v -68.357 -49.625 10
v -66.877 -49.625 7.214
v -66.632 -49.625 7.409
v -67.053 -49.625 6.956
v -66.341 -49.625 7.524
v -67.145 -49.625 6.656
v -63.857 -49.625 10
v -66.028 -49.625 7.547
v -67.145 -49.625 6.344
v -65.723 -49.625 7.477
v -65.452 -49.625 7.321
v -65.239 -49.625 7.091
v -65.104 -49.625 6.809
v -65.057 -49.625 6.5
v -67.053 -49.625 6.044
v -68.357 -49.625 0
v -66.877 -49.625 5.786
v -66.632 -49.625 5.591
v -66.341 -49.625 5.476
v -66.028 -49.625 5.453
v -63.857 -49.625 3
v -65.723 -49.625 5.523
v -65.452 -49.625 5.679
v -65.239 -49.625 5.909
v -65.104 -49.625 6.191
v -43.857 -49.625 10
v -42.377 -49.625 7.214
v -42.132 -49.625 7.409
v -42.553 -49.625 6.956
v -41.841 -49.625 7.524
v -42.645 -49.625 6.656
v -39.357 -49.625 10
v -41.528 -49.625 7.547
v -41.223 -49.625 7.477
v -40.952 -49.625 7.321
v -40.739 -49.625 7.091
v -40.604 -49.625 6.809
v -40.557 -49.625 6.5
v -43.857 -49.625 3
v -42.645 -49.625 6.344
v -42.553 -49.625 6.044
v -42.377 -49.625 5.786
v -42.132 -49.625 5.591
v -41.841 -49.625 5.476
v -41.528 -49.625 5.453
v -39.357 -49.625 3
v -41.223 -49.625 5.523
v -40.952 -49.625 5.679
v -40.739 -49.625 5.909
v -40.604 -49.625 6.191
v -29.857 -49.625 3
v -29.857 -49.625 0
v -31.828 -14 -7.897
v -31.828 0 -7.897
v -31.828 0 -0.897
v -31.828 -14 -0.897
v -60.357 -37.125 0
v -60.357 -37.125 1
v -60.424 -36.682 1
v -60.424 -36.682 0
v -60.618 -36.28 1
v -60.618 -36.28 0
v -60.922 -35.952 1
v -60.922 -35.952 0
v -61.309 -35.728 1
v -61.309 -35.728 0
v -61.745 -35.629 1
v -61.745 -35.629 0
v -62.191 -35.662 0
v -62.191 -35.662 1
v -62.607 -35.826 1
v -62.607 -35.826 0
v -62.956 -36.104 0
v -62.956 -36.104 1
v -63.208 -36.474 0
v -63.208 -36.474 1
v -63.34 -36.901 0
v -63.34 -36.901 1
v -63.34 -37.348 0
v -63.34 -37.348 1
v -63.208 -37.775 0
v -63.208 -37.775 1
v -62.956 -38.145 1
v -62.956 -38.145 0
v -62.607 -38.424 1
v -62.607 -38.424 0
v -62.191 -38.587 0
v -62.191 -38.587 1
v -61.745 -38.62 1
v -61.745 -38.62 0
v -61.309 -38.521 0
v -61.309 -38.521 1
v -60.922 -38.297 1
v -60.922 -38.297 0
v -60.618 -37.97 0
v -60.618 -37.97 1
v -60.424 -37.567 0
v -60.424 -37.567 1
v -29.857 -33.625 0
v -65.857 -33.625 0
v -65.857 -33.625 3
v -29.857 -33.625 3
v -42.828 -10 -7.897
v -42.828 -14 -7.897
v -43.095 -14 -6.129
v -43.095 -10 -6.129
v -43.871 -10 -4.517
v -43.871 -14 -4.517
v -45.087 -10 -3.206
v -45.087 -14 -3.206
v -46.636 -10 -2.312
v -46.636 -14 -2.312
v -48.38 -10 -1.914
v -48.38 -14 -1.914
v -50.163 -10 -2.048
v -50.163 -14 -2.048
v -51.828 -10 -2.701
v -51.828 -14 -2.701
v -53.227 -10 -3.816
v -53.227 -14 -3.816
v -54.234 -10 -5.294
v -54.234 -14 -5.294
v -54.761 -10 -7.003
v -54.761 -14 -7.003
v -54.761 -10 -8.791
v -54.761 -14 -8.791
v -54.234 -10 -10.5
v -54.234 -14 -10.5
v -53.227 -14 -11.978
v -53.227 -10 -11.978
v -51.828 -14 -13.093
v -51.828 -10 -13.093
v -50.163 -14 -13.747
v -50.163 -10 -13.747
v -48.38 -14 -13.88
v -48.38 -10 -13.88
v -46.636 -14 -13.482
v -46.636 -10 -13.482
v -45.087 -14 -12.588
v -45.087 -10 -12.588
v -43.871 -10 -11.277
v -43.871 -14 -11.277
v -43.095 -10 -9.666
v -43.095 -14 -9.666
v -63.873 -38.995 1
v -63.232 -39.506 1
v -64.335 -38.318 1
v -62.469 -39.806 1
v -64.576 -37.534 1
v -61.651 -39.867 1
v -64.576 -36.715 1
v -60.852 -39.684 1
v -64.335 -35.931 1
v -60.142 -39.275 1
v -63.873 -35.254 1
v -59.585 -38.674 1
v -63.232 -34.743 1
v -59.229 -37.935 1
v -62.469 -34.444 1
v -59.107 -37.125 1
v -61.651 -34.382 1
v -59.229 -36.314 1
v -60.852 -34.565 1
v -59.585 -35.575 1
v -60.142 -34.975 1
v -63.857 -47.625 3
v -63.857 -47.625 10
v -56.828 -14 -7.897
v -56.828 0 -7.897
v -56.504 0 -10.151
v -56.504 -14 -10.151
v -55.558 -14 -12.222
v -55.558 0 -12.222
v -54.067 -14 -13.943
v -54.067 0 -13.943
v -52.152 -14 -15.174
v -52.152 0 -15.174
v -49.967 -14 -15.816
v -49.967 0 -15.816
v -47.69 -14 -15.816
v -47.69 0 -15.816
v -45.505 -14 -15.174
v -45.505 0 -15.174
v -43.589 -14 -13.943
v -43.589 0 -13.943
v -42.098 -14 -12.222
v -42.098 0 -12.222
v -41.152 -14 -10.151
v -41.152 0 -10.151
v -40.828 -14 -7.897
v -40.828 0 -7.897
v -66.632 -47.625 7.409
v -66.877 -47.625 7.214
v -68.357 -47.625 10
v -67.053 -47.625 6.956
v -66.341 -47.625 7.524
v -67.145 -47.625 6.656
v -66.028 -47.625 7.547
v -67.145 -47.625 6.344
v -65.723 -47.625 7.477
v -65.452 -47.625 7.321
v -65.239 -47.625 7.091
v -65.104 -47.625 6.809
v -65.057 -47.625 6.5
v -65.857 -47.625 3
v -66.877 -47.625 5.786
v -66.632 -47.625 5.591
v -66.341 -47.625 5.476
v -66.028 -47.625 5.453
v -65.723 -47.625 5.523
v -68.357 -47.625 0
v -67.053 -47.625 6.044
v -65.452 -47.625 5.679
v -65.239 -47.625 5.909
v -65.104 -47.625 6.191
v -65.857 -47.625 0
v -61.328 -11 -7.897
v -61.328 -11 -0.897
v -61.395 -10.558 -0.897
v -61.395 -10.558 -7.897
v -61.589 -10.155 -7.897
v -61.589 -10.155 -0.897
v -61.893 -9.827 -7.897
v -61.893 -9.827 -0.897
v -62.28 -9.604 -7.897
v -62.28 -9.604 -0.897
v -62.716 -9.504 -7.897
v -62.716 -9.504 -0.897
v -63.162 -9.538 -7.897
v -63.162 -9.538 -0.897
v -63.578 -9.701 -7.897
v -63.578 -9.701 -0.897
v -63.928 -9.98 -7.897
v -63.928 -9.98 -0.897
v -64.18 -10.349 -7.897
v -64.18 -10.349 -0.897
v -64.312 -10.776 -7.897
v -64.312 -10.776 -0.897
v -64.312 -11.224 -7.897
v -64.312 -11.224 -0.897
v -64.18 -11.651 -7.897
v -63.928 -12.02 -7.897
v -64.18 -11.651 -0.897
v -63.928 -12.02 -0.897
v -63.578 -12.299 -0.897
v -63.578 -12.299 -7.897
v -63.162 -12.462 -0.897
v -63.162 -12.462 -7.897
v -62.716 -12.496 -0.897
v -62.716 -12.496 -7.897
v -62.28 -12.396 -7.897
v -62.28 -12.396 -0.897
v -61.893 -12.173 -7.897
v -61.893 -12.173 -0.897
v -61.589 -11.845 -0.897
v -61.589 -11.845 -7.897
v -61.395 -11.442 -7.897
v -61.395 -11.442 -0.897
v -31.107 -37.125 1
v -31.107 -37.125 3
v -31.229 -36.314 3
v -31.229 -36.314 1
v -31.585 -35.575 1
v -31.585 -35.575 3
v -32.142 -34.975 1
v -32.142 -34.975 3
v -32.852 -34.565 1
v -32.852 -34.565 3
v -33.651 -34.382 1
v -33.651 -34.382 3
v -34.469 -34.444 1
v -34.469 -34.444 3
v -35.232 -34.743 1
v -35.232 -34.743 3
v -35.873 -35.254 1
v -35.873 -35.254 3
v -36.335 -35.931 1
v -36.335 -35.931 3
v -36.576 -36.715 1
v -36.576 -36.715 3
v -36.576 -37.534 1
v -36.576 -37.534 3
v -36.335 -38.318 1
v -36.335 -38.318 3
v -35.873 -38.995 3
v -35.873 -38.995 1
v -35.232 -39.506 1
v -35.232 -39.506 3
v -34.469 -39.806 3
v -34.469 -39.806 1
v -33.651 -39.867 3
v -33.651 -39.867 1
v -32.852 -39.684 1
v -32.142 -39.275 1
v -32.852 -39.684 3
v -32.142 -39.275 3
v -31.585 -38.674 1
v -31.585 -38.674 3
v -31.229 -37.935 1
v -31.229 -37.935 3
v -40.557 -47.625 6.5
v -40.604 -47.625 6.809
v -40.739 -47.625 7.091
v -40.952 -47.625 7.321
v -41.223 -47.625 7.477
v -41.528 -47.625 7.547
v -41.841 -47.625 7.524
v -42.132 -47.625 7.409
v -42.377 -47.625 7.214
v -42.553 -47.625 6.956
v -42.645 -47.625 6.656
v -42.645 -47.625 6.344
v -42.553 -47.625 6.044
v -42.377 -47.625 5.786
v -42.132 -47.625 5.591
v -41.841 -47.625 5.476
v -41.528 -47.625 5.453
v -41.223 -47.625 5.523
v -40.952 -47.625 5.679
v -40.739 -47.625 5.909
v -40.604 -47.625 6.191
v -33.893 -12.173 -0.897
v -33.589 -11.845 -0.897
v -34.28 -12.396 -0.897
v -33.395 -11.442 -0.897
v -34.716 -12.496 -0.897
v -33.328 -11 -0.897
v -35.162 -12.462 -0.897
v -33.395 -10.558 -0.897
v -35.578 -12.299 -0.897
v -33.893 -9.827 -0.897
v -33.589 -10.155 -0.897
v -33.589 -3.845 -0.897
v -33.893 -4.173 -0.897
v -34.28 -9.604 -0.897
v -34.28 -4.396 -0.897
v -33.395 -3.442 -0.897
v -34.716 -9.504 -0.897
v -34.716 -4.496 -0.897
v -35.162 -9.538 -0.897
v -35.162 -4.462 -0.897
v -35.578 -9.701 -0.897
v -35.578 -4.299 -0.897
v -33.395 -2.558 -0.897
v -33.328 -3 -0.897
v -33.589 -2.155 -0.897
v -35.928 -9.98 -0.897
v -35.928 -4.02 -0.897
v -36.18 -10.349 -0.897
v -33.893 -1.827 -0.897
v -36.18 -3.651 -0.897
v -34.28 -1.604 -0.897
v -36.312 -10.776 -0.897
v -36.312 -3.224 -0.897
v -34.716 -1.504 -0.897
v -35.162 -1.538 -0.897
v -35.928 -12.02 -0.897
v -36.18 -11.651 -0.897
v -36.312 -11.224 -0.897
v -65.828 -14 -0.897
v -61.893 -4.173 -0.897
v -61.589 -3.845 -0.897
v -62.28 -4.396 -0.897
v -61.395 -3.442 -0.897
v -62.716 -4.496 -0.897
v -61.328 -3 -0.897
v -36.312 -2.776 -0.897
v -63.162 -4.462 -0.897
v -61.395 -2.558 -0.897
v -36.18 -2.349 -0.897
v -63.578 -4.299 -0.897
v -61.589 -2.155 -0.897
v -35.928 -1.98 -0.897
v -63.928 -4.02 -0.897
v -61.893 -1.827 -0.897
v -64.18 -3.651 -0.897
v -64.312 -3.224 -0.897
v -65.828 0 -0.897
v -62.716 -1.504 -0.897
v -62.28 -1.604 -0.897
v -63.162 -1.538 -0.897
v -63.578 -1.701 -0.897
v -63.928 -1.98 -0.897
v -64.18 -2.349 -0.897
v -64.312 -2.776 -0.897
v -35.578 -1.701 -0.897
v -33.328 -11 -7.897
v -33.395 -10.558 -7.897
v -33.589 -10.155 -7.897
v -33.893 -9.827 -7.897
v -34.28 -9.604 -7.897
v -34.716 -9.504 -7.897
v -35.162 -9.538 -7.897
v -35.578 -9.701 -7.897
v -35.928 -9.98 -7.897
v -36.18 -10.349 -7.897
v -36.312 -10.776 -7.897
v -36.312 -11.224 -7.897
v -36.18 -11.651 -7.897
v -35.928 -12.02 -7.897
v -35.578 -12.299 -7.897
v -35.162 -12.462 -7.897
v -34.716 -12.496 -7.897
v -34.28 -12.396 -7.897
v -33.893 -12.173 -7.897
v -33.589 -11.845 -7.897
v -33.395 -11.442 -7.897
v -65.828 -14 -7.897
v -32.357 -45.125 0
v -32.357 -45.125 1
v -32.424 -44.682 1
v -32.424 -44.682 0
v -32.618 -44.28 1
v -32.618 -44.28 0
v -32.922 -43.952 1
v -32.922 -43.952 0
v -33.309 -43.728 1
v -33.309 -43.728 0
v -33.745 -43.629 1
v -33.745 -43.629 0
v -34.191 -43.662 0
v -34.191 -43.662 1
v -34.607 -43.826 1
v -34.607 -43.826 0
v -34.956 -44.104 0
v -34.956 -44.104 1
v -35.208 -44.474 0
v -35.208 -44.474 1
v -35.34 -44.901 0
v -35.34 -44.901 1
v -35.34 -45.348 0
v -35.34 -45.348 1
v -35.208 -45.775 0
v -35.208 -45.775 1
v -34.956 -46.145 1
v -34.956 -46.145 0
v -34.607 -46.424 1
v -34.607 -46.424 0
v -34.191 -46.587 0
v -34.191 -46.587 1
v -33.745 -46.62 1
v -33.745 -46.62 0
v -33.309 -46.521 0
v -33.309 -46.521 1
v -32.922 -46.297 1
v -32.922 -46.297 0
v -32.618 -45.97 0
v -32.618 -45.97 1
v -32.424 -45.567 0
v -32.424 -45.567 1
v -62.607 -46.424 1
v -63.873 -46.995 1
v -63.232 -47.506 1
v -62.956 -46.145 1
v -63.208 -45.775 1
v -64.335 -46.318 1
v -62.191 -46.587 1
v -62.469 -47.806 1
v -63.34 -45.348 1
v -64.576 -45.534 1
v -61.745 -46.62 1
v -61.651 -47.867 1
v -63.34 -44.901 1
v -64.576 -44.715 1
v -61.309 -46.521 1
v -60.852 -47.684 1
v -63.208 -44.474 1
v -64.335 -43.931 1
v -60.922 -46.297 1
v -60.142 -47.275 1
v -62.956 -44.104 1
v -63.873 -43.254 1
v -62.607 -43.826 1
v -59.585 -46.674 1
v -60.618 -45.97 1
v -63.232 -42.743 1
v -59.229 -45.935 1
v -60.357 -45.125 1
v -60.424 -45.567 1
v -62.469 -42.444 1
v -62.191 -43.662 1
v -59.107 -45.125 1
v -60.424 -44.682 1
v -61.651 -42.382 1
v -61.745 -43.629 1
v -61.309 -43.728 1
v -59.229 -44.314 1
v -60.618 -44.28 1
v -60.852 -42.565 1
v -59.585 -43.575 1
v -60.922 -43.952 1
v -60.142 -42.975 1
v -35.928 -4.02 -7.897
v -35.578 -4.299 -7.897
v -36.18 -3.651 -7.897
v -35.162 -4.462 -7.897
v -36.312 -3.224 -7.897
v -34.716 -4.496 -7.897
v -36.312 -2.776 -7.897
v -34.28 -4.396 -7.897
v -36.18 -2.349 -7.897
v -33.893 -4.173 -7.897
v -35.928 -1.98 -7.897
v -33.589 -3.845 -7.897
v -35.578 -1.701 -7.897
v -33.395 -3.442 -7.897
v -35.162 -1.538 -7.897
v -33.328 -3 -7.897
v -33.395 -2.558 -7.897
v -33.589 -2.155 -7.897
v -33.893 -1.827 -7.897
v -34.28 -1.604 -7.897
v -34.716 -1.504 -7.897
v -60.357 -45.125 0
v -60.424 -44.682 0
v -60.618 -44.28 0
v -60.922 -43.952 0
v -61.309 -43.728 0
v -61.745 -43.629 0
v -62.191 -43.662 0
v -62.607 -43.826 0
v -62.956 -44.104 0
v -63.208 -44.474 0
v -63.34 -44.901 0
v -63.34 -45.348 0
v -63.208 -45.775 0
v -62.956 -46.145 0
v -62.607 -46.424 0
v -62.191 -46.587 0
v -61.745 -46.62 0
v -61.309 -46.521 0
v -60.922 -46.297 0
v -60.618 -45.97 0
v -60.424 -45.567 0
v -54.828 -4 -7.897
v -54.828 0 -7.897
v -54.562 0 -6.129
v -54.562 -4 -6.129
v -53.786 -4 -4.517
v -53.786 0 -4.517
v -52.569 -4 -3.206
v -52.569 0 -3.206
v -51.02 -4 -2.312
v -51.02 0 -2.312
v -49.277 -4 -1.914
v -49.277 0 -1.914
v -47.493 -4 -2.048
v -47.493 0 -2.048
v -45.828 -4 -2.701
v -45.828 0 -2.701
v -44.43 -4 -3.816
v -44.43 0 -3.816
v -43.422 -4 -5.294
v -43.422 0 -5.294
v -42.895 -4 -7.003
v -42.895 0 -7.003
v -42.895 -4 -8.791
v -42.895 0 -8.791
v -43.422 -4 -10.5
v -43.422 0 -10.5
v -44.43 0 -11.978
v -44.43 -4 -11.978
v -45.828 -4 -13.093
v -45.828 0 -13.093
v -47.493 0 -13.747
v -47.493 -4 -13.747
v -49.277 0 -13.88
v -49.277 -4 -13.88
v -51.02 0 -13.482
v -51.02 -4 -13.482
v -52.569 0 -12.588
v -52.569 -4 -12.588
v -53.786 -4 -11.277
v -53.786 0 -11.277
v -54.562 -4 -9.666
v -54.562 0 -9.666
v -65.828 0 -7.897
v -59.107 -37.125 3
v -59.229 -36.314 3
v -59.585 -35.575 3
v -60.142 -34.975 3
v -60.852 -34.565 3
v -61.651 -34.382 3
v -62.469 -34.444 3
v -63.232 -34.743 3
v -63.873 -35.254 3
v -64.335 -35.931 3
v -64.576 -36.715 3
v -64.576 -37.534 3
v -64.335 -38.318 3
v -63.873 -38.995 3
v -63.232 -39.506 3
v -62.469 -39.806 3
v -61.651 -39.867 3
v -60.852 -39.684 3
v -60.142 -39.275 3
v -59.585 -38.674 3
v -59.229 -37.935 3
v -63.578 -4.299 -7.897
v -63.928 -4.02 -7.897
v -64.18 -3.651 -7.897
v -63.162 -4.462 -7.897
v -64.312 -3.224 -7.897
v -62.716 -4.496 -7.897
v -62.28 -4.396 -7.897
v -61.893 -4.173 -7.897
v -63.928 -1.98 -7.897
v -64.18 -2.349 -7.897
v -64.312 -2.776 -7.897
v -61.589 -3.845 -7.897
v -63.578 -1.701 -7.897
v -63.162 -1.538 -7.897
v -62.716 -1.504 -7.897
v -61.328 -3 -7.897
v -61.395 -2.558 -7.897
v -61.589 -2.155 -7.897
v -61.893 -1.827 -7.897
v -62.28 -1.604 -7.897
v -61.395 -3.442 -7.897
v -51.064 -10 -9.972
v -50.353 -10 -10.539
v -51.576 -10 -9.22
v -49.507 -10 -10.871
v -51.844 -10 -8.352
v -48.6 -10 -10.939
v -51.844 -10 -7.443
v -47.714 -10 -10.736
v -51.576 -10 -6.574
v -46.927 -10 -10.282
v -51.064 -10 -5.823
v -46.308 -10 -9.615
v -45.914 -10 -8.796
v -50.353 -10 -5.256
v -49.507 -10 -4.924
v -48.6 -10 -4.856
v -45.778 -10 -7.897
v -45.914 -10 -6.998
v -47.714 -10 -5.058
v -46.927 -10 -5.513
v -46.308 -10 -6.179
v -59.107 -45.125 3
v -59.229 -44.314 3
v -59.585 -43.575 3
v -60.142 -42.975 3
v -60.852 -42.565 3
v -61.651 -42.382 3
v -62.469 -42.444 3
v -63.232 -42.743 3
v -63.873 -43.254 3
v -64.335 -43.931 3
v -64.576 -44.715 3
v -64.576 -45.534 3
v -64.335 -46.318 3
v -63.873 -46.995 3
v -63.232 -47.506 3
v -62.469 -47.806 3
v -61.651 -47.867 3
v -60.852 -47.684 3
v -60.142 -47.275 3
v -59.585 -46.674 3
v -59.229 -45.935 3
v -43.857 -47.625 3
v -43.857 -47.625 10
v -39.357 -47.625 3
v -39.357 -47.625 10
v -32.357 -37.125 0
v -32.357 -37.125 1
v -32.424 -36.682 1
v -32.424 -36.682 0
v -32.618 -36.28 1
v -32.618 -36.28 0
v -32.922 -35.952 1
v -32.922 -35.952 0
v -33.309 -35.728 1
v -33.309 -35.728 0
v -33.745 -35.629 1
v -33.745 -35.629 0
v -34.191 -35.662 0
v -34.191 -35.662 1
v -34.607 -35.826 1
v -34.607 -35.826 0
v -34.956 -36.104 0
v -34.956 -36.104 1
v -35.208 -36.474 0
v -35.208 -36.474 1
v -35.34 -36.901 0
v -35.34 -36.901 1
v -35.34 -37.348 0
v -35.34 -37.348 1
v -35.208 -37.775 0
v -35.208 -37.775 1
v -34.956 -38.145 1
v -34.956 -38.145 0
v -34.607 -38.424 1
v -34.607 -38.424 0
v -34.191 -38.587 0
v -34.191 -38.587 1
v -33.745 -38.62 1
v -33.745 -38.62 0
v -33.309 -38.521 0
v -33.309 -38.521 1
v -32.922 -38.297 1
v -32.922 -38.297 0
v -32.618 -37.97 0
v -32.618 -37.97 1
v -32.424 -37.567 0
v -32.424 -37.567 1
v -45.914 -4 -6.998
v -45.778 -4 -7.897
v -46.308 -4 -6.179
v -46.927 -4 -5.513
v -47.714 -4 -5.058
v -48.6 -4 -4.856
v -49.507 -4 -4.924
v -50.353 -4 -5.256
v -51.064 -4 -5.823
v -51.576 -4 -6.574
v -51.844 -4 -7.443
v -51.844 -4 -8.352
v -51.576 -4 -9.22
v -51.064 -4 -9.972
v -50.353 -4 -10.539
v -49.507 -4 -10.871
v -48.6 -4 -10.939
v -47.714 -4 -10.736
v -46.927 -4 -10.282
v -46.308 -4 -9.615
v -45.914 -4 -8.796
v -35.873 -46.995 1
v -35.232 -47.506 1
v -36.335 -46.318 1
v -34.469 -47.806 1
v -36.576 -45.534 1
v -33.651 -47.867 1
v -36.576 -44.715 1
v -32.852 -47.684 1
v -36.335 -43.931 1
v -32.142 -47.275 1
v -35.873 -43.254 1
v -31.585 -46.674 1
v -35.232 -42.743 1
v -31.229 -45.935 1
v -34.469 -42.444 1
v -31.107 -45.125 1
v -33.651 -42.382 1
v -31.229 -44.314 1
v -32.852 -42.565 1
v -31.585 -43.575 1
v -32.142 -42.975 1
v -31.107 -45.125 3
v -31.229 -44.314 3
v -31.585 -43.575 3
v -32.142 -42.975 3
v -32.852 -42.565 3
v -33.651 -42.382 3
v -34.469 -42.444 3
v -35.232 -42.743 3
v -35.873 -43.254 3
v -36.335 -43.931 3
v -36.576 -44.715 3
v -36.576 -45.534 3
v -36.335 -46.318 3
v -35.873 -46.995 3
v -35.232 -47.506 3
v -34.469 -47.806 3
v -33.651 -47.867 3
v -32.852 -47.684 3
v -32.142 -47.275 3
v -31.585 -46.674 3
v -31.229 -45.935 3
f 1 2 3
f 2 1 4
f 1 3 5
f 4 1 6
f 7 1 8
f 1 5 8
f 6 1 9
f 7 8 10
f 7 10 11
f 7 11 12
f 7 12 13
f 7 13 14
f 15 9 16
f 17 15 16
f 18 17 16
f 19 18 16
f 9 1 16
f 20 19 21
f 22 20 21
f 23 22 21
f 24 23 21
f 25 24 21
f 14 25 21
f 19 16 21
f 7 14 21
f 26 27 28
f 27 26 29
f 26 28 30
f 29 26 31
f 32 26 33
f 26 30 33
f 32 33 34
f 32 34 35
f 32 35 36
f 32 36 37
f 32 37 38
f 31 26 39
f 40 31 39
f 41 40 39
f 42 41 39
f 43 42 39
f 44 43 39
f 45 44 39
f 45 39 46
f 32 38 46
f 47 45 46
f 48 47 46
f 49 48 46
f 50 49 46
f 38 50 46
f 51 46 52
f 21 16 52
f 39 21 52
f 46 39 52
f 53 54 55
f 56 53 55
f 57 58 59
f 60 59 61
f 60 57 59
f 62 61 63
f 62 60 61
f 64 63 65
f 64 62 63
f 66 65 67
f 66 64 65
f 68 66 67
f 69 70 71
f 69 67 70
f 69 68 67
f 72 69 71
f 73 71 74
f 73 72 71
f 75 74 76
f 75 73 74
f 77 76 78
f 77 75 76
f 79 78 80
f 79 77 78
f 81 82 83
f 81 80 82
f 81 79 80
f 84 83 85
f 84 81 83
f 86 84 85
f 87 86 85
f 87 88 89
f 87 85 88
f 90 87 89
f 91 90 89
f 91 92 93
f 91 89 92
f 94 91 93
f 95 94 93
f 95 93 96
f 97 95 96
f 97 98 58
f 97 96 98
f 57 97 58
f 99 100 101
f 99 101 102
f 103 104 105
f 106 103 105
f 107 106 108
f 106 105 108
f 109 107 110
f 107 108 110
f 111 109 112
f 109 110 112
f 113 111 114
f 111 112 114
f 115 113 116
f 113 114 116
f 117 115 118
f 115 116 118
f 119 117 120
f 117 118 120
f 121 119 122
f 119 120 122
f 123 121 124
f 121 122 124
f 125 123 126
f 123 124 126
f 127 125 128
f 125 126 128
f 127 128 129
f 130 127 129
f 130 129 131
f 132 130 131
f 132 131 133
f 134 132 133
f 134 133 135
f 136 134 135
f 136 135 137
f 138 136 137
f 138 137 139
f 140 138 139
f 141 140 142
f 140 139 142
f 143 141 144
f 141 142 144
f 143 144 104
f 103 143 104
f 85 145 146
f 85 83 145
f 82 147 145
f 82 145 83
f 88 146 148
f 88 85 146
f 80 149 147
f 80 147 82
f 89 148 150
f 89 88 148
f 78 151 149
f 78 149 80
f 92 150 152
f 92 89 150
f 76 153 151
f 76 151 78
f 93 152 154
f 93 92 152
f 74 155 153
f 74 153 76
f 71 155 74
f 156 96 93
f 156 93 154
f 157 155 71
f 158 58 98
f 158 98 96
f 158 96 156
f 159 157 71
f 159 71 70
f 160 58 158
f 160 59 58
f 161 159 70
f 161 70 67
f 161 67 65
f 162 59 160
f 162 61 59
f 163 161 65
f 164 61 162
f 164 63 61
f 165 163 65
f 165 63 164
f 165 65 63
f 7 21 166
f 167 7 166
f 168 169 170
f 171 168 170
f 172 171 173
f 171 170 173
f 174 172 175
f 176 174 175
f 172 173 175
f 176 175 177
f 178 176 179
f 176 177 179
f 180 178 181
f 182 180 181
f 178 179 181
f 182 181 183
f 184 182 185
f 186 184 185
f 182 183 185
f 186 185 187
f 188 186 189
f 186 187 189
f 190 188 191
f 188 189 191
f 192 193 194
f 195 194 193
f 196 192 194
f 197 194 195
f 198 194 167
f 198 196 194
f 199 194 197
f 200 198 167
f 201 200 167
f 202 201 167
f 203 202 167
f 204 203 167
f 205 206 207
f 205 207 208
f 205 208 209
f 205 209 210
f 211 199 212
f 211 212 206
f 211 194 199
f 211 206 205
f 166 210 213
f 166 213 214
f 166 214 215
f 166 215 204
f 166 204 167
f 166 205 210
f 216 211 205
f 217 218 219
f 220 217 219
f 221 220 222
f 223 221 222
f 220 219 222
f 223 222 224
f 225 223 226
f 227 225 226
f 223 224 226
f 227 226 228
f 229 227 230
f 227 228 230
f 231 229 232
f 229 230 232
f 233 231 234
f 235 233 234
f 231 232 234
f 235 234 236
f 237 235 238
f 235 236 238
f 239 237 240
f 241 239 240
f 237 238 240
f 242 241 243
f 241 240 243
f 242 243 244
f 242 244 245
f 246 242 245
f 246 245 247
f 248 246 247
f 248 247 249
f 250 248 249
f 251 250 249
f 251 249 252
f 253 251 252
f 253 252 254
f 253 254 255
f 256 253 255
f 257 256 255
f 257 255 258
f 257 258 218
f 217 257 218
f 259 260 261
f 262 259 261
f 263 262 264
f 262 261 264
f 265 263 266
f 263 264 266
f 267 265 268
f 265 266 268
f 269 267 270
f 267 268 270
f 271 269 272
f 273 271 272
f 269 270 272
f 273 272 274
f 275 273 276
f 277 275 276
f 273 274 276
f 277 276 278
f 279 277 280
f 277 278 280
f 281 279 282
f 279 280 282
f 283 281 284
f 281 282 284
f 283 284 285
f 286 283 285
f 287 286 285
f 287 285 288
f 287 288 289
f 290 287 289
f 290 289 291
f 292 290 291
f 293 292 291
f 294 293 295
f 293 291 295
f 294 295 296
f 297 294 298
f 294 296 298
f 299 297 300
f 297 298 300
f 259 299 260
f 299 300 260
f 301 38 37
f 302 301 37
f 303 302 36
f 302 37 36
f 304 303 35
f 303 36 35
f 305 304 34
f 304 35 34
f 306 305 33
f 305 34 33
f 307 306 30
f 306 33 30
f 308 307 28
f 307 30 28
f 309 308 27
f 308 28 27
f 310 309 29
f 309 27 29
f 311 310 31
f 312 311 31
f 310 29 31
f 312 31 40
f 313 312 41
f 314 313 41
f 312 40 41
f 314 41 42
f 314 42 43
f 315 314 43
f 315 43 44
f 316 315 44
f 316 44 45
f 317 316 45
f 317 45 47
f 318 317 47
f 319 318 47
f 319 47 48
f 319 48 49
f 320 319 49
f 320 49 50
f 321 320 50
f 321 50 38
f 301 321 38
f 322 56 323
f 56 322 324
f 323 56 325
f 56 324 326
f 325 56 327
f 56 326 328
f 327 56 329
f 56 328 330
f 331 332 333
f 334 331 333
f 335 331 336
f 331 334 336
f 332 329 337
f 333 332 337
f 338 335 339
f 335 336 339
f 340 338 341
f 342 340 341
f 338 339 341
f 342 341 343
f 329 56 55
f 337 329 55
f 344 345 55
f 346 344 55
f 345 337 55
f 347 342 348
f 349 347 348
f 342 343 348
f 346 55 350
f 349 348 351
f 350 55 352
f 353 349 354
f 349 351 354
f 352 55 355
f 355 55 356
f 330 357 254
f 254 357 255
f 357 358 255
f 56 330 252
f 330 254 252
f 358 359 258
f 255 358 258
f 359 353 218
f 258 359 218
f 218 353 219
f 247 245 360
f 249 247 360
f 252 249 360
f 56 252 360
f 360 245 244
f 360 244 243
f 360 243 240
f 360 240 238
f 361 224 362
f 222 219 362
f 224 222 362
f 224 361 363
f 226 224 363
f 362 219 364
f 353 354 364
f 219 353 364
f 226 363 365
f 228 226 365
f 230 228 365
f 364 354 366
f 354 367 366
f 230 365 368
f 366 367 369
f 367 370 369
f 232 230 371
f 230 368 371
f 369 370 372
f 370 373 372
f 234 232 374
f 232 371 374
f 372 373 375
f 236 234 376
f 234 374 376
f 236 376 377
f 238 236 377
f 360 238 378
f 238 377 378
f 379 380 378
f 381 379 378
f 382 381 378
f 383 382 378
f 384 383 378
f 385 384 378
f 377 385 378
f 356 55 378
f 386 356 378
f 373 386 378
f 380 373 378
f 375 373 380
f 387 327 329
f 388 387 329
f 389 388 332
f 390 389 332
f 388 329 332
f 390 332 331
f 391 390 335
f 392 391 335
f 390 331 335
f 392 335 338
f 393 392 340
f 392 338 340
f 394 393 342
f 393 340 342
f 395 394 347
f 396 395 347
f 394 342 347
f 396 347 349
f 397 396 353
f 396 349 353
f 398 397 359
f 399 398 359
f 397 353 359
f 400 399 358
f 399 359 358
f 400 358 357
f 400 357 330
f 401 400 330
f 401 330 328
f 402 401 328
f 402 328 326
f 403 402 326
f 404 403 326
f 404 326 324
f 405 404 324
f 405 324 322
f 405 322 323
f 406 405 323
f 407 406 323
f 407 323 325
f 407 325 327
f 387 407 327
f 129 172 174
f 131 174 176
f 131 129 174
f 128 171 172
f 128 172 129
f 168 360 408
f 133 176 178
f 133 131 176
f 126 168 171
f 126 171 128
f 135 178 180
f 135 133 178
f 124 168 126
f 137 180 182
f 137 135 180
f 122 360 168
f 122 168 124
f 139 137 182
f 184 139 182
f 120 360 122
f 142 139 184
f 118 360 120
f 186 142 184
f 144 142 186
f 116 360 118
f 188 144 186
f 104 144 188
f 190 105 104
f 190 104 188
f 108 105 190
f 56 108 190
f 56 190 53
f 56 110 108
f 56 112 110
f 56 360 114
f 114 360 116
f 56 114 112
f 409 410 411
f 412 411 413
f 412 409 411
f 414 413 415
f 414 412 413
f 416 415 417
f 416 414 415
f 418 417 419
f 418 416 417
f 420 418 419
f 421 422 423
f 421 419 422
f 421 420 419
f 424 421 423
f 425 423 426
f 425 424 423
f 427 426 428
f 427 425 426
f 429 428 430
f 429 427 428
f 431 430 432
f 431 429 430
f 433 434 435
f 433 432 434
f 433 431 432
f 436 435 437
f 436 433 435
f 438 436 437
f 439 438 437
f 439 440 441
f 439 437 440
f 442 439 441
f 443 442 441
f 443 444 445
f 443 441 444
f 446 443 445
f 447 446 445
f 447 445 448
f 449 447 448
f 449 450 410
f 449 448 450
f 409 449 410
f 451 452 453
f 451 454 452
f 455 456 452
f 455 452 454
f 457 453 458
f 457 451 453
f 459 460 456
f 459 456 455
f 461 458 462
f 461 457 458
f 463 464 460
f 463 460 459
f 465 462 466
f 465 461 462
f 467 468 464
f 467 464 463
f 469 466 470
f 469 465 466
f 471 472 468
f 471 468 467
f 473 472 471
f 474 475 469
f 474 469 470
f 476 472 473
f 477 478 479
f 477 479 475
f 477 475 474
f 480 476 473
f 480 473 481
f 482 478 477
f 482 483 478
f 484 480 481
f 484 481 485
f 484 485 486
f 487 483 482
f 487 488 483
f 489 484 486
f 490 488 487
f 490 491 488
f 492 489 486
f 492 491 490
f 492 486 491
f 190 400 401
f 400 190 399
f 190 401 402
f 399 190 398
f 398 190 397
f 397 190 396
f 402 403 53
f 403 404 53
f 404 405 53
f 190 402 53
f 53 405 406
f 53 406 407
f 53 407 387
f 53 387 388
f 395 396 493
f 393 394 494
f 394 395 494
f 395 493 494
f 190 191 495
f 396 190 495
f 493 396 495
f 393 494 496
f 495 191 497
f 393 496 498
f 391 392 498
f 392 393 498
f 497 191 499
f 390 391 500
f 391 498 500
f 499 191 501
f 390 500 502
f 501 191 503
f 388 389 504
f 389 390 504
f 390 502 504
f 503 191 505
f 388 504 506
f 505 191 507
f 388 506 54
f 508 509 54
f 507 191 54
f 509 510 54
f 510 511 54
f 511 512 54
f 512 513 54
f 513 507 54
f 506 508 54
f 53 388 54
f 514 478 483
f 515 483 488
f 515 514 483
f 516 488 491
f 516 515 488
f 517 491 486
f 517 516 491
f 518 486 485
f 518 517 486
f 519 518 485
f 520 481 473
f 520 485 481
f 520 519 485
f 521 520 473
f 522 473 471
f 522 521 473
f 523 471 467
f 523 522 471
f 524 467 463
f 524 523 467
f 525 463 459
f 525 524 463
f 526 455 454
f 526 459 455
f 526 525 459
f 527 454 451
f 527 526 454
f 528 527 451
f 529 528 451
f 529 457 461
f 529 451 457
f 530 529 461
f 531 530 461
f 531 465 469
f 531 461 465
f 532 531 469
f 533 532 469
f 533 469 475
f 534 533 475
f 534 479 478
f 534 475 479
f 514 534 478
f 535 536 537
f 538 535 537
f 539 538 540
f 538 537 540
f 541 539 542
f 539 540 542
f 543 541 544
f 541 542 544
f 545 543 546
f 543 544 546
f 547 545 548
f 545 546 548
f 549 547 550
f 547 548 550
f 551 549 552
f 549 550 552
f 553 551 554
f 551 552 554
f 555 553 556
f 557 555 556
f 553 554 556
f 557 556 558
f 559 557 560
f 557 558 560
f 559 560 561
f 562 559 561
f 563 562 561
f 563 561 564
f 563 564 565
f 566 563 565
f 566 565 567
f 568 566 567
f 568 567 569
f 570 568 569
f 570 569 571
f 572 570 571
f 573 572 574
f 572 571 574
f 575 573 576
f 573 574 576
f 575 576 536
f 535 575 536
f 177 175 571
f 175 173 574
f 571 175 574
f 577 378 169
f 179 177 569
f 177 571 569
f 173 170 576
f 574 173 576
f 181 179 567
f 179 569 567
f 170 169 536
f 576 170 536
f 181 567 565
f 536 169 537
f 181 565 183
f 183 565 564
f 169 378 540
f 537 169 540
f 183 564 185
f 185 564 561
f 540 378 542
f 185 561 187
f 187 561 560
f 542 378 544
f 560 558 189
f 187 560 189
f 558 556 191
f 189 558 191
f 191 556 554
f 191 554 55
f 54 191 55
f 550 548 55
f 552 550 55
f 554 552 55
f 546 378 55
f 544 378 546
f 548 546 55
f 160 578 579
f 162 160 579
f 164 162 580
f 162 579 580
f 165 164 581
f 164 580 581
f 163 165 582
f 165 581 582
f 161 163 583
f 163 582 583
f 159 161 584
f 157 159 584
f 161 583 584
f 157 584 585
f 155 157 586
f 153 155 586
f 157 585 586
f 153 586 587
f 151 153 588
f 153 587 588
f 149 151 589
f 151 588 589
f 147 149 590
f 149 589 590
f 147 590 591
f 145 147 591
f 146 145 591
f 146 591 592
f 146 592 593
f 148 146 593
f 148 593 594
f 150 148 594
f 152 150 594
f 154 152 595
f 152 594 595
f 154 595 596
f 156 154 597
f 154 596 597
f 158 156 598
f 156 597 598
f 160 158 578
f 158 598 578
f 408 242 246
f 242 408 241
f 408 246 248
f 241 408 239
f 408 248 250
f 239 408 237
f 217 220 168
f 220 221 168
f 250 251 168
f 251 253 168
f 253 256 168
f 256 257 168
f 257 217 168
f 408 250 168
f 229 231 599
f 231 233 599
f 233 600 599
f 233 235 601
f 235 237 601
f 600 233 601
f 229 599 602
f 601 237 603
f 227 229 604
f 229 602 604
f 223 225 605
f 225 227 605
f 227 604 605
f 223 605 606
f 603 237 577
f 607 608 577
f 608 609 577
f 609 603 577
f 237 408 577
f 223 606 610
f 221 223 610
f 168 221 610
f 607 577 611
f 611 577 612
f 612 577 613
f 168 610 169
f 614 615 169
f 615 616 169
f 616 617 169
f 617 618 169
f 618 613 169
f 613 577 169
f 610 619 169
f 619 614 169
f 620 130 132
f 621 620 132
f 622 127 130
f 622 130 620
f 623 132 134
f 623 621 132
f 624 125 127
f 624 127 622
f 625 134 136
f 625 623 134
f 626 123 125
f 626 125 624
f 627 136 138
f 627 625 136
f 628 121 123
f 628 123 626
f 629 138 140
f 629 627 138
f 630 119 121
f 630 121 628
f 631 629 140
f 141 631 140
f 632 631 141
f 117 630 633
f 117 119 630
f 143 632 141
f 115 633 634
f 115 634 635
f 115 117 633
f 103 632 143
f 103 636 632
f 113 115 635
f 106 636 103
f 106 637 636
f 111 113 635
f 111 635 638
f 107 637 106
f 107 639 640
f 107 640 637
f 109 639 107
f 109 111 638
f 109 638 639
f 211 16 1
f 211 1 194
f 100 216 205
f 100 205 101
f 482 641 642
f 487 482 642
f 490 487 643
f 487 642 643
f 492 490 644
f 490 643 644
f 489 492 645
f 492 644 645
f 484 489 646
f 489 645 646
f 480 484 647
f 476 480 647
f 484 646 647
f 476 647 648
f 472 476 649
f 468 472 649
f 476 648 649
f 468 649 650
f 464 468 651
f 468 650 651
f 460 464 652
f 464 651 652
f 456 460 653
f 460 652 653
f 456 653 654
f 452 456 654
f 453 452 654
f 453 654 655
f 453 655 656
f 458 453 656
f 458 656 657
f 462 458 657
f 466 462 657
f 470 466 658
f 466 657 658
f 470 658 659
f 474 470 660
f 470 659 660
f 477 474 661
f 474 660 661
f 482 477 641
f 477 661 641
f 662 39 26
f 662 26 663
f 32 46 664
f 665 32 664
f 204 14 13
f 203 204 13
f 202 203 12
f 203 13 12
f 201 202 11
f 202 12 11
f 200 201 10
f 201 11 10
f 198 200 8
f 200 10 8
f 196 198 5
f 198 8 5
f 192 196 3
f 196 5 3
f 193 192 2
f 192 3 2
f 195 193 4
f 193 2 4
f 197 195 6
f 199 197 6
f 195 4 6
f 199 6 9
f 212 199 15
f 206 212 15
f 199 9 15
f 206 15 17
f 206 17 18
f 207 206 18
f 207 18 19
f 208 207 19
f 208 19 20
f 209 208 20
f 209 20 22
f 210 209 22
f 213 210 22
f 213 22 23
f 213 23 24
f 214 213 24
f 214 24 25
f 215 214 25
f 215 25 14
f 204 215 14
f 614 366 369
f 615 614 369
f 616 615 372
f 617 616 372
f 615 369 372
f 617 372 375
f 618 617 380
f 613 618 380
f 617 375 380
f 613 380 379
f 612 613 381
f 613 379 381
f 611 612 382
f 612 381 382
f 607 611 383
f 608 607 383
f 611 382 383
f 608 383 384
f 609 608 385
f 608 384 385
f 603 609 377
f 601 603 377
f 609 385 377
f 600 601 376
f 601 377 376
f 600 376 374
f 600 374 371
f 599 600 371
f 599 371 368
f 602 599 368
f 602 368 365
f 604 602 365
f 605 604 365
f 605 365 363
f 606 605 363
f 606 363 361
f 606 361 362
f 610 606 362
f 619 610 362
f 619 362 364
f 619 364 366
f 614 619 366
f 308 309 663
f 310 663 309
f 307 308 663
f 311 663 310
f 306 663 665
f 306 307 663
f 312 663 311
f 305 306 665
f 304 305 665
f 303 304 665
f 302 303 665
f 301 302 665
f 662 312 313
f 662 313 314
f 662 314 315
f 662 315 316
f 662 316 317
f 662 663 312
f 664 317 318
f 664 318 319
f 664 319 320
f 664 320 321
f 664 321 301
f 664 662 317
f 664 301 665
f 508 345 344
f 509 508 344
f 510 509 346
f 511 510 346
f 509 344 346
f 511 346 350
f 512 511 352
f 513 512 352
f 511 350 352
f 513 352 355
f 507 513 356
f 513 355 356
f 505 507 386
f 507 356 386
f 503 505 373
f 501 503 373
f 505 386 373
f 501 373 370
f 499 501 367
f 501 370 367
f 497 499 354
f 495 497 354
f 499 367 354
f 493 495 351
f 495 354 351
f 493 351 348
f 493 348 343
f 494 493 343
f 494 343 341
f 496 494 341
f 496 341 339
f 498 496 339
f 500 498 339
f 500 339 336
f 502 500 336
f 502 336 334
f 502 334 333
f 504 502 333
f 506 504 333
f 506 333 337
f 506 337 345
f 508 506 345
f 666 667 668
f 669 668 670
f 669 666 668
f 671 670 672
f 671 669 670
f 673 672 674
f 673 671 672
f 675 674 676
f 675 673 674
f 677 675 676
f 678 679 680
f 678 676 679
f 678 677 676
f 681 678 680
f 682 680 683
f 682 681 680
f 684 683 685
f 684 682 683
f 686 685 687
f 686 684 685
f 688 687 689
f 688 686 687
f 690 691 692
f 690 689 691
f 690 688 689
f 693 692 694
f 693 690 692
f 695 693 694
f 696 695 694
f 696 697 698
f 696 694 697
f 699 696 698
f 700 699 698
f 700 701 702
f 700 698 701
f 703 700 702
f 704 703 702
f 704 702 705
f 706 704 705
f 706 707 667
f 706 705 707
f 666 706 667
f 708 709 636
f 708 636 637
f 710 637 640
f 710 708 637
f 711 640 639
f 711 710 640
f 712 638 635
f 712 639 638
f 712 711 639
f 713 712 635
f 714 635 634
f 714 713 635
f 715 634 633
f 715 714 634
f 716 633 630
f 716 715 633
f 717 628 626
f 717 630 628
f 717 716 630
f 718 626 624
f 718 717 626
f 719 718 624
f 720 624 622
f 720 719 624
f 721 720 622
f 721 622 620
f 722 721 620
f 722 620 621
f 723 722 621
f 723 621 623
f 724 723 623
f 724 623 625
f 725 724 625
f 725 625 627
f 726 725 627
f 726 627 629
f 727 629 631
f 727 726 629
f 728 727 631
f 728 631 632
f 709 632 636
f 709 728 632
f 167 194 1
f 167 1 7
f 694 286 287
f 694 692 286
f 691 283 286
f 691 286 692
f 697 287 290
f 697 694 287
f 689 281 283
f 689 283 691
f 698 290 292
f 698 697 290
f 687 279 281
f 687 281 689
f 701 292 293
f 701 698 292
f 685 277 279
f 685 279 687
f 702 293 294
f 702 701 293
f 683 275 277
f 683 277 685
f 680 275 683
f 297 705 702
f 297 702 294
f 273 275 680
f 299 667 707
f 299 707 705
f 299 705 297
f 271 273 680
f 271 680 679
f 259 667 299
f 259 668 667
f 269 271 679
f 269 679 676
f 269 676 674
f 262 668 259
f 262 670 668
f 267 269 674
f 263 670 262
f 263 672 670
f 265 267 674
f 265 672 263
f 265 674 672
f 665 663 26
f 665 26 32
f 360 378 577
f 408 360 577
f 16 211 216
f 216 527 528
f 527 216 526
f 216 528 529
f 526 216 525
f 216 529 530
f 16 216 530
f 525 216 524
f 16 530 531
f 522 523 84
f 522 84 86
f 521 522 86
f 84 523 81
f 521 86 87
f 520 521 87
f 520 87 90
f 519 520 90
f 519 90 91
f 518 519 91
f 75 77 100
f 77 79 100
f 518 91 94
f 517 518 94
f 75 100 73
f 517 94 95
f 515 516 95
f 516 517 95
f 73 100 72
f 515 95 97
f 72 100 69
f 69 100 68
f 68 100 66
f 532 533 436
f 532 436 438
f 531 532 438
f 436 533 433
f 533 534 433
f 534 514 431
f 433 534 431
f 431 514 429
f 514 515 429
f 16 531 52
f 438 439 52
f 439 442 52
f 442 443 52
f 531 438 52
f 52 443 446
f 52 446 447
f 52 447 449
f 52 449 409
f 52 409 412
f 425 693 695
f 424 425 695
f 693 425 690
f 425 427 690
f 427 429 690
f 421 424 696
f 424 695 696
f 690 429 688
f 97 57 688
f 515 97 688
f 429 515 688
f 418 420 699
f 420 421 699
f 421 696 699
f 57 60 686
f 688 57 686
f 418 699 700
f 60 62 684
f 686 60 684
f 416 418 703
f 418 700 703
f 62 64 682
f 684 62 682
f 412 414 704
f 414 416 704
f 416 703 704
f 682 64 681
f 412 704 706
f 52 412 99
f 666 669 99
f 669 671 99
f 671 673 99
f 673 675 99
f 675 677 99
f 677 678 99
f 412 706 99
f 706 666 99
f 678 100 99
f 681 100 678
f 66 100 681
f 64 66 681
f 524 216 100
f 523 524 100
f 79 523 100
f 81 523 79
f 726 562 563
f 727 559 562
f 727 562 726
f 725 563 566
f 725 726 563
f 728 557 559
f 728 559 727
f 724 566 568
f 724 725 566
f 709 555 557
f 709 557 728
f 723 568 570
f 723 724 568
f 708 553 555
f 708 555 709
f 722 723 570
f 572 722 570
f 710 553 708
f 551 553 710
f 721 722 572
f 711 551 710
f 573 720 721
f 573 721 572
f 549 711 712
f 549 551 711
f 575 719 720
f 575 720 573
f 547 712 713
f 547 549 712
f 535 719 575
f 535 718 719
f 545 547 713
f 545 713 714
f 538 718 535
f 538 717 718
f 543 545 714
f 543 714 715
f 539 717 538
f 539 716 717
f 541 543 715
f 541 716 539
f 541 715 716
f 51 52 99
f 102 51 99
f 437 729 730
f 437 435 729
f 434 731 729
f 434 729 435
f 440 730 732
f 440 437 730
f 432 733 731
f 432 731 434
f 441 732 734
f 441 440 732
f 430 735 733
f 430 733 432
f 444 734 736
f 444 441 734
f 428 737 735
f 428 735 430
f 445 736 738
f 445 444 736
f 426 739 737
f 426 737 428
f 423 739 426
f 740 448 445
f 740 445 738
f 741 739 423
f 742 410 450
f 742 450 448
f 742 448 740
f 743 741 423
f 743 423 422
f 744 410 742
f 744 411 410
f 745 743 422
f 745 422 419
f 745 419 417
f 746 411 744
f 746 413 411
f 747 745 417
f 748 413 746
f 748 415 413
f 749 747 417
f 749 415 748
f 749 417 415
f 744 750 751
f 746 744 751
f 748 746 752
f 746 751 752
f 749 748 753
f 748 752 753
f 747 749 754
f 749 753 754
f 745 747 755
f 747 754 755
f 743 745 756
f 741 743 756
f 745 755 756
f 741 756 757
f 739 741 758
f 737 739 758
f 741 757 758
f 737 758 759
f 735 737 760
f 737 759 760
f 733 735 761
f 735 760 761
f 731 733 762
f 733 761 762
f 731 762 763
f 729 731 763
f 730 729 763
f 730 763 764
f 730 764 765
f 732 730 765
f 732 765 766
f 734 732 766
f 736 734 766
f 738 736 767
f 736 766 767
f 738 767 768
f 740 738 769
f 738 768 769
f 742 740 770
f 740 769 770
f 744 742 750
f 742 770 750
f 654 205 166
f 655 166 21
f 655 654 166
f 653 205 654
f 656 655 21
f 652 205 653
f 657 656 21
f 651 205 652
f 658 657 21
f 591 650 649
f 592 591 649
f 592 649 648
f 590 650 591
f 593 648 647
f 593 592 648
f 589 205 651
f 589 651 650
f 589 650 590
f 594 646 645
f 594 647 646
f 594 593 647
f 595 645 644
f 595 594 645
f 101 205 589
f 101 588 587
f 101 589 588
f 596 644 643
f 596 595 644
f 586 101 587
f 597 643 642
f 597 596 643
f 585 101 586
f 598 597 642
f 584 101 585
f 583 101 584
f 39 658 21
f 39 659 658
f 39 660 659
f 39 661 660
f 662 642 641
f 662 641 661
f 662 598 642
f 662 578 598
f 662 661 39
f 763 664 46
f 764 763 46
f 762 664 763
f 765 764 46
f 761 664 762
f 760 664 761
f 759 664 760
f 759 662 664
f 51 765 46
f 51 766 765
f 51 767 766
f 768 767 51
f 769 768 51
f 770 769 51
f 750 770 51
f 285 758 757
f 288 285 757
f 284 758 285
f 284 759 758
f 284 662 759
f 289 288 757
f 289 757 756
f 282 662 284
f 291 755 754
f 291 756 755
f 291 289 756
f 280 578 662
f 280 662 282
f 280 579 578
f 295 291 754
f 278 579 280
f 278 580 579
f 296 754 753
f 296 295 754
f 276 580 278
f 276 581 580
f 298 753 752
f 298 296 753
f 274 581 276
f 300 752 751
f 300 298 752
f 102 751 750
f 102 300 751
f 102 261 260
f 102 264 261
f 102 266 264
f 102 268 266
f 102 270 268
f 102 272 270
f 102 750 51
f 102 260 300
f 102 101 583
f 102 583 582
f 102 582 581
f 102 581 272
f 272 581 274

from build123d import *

# Parameters (mm, degrees)
F0_R           = 3.05
F1_DEPTH       = 14
F2_R           = 6
F3_DEPTH       = 4
F4_R           = 6
F5_DEPTH       = 4
F6_R           = 1.5
F7_DEPTH       = 15.001
F8_W           = 36
F8_H           = 16
F8_R           = 1.5
F9_DEPTH       = 3
F10_R          = 2.75
F11_DEPTH      = 2
F12_W          = 4.5
F12_H          = 2
F13_DEPTH      = 7
F13_DEPTH_BACK = 3
F14_R          = 1.05
F15_DEPTH      = 49.625559


with BuildPart() as f1:
    # F0 (on Front) → F1 (new body)
    with BuildSketch(Plane.XZ):
        with BuildLine():
            Line((-65.828289, -7.897141), (-56.828289, -7.897141))
            ThreePointArc((-56.828289, -7.897141), (-48.828289, -15.897141), (-40.828289, -7.897141))
            Line((-40.828289, -7.897141), (-31.828289, -7.897141))
            Line((-31.828289, -7.897141), (-31.828289, -0.897141))
            Line((-31.828289, -0.897141), (-65.828289, -0.897141))
            Line((-65.828289, -0.897141), (-65.828289, -7.897141))
        make_face()
        with Locations((-48.828289, -7.897141)):
            Circle(F0_R, mode=Mode.SUBTRACT)
    extrude(amount=F1_DEPTH)

    # F2 (on face) → F3 (cut)
    with BuildSketch(Plane.XZ.offset(14)):
        with Locations((-48.828289, -7.897141)):
            Circle(F2_R)
    extrude(amount=-F3_DEPTH, mode=Mode.SUBTRACT)

    # F4 (on face) → F5 (cut)
    with BuildSketch(Plane(origin=(0, 0, 0), x_dir=(-1, 0, 0), z_dir=(0, 1, 0))):
        with Locations((48.828289, -7.897141)):
            Circle(F4_R)
    extrude(amount=-F5_DEPTH, mode=Mode.SUBTRACT)

    # F6 (on face) → F7 (cut, through all)
    with BuildSketch(Plane.XY.offset(-0.897141)):
        with Locations((-62.828289, -3)):
            Circle(F6_R)
        with Locations((-34.828289, -3)):
            Circle(F6_R)
        with Locations((-34.828289, -11)):
            Circle(F6_R)
        with Locations((-62.828289, -11)):
            Circle(F6_R)
    extrude(amount=-F7_DEPTH, mode=Mode.SUBTRACT)


with BuildPart() as f9:
    # F8 (on Top) → F9 (new body)
    with BuildSketch(Plane.XY):
        with Locations((-47.856896, -41.624559)):
            Rectangle(F8_W, F8_H)
        with Locations((-61.856896, -45.124559)):
            Circle(F8_R, mode=Mode.SUBTRACT)
        with Locations((-33.856896, -45.124559)):
            Circle(F8_R, mode=Mode.SUBTRACT)
        with Locations((-61.856896, -37.124559)):
            Circle(F8_R, mode=Mode.SUBTRACT)
        with Locations((-33.856896, -37.124559)):
            Circle(F8_R, mode=Mode.SUBTRACT)
    extrude(amount=F9_DEPTH)

    # F10 (on face) → F11 (cut)
    with BuildSketch(Plane.XY.offset(3)):
        with Locations((-61.856896, -37.124559)):
            Circle(F10_R)
        with Locations((-33.856896, -37.124559)):
            Circle(F10_R)
        with Locations((-61.856896, -45.124559)):
            Circle(F10_R)
        with Locations((-33.856896, -45.124559)):
            Circle(F10_R)
    extrude(amount=-F11_DEPTH, mode=Mode.SUBTRACT)

    # F12 (on face) → F13 (join, two sides)
    with BuildSketch(Plane.XY.offset(3)) as f13_sk:
        with Locations((-41.606896, -48.624559)):
            Rectangle(F12_W, F12_H)
        with Locations((-66.106896, -48.624559)):
            Rectangle(F12_W, F12_H)
    extrude(amount=F13_DEPTH)
    extrude(f13_sk.sketch, amount=-F13_DEPTH_BACK)

    # F14 (on face) → F15 (cut, through all)
    with BuildSketch(Plane.XZ.offset(49.624559)):
        with Locations((-41.606896, 6.5)):
            Circle(F14_R)
        with Locations((-66.106896, 6.5)):
            Circle(F14_R)
    extrude(amount=-F15_DEPTH, mode=Mode.SUBTRACT)


solid = Compound([f1.part, f9.part])
